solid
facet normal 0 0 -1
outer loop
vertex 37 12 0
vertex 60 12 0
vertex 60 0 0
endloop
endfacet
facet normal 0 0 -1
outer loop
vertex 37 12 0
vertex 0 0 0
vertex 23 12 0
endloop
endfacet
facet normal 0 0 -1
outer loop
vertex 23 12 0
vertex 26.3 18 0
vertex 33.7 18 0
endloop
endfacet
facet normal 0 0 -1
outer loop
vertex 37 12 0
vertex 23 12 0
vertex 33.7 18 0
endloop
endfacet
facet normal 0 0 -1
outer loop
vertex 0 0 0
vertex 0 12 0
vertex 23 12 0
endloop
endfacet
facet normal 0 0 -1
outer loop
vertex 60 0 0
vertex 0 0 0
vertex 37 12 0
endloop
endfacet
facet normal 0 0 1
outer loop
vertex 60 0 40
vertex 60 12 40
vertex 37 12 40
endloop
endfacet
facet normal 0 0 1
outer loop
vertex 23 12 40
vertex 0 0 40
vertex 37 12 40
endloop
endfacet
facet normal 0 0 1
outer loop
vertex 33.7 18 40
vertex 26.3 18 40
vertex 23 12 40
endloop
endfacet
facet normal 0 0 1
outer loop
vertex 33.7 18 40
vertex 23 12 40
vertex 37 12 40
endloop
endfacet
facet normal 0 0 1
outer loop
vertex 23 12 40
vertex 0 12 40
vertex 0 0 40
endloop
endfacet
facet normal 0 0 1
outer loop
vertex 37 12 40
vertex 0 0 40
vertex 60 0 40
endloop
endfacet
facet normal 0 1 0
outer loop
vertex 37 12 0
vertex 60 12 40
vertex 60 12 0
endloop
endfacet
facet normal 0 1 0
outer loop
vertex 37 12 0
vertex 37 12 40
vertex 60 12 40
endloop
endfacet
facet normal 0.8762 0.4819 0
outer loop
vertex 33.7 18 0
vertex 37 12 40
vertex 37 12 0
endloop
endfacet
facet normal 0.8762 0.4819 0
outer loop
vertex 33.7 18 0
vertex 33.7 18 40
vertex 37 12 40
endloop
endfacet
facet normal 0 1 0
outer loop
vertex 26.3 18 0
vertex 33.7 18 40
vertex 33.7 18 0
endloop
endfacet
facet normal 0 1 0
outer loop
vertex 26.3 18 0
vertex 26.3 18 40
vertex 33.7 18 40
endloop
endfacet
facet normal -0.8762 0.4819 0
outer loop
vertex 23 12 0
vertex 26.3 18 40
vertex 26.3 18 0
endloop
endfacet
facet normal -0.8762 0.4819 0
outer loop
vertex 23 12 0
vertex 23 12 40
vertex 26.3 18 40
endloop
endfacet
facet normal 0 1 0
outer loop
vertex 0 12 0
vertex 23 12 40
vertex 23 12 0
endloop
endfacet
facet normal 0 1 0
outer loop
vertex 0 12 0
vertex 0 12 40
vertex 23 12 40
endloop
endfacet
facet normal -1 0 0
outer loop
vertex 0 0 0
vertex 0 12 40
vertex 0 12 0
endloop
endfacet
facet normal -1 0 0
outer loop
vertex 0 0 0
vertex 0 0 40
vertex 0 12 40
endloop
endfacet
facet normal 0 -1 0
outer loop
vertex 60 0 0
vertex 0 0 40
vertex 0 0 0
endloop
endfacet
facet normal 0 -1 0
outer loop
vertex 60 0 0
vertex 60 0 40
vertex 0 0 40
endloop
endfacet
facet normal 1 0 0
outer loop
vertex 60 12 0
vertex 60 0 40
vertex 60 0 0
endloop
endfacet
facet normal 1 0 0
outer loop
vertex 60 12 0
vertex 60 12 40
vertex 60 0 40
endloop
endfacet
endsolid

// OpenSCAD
$fn = 32;

// ----------------------------------------------------------------------
// V guide rail: dovetail, 60 mm wide
// ----------------------------------------------------------------------

// --- parameters (mm) ---
rail_w = 60;              // rail width, X
base_t = 12;              // base plate thickness
v_depth = 6;              // V feature depth / height
v_half_w = 7;             // half width of the V at the base face
plate_t = 40;             // rail length, Z (the extrusion height)
top_half_w = 3.7;         // half width at the dovetail top
fit_tol = 0.02;           // declared fit tolerance (prompt contract)
free_tol = 0.2;           // declared free tolerance (prompt contract)

dovetail_base = 2 * v_half_w;  // dovetail width at the base
dovetail_top = 2 * top_half_w;  // dovetail width at the top

profile = [[0, 0], [60, 0], [60, 12], [37, 12], [33.7, 18], [26.3, 18], [23, 12], [0, 12]];  // primary outline, 8 points, counter clockwise

// --- the one profile operation ---
linear_extrude(height = plate_t) polygon(points = profile);
